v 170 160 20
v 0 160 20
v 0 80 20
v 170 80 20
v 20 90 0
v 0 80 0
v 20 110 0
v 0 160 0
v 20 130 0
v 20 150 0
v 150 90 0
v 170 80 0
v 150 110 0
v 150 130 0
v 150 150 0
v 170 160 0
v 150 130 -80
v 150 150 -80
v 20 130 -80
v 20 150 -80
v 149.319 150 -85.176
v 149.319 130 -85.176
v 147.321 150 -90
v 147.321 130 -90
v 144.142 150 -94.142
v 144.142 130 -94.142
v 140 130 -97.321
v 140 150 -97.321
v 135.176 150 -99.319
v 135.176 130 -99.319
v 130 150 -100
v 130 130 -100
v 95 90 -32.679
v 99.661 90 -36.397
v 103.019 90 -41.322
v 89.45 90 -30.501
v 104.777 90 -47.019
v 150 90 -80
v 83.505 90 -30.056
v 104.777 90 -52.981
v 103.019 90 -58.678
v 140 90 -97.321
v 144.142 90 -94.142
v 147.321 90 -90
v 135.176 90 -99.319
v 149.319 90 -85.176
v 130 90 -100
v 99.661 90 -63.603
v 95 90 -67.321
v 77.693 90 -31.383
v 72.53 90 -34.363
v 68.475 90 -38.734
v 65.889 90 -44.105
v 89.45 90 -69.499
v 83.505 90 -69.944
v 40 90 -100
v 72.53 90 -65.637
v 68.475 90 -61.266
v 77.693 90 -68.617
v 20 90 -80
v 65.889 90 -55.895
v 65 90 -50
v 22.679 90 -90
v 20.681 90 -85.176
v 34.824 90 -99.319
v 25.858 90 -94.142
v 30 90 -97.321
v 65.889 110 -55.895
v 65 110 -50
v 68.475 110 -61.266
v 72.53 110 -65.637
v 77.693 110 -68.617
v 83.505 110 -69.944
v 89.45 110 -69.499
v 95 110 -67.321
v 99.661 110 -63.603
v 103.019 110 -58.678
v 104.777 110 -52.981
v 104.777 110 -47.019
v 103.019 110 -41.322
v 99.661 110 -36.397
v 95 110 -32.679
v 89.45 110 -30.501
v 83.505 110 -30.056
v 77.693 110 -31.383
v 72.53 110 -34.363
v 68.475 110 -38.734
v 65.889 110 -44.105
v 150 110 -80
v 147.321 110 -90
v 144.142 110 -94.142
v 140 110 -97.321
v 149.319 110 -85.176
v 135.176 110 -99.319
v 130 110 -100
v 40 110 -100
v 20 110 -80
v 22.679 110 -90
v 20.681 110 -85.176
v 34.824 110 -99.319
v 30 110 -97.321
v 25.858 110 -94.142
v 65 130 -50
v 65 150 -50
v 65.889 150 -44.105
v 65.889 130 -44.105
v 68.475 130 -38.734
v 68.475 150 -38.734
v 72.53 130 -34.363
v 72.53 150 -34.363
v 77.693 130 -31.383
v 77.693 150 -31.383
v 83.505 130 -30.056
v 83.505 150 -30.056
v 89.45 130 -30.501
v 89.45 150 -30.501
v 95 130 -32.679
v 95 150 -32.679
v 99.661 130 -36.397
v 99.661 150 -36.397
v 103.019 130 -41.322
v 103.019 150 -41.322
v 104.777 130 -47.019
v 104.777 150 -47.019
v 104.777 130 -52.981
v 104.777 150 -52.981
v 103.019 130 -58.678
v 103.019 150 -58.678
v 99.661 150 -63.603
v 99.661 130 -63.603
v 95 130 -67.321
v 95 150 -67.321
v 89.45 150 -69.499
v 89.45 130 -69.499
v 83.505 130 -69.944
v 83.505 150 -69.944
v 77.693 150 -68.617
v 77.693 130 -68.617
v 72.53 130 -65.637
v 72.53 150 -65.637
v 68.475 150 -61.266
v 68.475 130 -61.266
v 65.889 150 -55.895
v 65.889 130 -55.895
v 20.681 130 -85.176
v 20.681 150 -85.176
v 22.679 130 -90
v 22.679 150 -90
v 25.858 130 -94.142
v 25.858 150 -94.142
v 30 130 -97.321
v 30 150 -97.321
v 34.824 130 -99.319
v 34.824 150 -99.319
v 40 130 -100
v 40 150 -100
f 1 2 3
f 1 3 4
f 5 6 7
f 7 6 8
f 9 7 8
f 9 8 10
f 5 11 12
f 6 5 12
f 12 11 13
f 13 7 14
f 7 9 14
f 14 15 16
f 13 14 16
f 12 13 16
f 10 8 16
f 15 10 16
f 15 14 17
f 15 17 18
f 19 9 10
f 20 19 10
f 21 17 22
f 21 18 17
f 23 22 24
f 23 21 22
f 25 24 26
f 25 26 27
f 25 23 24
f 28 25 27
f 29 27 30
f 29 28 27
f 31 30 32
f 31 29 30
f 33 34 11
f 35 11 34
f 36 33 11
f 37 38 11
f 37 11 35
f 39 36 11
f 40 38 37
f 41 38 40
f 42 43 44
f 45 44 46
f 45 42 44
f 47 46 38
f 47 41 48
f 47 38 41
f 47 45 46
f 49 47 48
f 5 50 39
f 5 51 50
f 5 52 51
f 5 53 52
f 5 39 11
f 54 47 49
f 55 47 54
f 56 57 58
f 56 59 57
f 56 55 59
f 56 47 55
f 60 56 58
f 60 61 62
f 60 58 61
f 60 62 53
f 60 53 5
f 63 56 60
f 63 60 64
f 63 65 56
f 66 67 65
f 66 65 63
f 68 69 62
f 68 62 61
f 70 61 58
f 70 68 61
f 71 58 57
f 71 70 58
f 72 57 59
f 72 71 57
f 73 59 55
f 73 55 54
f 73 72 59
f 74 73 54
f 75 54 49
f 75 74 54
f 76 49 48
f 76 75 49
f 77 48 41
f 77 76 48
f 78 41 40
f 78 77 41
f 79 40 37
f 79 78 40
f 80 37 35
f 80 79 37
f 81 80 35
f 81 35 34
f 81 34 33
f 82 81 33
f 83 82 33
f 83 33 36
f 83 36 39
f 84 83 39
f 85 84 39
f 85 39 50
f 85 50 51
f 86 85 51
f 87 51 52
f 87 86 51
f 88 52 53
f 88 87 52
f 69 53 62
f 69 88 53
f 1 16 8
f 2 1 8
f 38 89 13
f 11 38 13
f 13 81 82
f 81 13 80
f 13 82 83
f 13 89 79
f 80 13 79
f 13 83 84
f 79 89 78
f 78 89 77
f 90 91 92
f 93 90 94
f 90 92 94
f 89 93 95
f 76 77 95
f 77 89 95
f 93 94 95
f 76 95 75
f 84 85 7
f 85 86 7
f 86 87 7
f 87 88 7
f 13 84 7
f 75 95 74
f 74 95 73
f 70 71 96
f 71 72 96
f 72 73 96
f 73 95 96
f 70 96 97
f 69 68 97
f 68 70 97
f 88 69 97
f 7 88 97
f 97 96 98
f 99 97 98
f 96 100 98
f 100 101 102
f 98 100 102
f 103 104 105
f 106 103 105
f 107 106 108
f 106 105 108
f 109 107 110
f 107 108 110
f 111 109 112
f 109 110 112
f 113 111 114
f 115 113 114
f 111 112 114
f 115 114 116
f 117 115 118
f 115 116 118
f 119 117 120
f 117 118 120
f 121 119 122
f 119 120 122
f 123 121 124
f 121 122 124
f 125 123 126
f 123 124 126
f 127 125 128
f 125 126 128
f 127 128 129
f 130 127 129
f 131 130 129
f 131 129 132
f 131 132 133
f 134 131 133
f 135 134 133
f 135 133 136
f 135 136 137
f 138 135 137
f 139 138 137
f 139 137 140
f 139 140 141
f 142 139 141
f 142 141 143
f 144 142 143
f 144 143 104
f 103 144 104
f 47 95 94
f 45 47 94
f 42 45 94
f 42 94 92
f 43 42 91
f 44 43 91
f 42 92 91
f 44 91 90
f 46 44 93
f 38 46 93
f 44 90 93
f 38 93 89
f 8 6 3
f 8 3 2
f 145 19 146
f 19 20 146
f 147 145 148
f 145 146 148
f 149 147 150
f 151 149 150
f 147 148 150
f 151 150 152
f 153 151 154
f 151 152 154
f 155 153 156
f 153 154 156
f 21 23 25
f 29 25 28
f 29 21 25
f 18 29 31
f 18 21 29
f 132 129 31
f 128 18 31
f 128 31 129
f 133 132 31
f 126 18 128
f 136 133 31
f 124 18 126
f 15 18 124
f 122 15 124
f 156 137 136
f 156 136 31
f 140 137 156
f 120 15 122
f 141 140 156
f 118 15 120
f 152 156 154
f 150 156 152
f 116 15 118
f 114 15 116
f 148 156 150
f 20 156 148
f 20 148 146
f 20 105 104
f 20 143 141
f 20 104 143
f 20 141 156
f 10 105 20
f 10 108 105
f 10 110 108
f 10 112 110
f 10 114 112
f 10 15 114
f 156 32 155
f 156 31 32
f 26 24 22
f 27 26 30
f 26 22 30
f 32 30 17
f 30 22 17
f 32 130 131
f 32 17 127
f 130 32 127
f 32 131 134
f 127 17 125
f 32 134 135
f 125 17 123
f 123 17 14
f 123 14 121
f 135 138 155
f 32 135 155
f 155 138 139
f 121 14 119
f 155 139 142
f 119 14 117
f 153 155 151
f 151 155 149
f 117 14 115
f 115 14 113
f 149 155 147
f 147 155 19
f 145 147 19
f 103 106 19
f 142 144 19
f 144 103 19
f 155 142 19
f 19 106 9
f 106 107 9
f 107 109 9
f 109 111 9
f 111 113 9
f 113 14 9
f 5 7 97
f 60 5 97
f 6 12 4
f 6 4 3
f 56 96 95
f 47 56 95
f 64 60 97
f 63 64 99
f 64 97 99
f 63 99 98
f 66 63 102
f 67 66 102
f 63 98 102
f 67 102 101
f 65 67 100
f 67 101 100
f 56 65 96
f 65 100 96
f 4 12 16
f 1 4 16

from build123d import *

# Parameters (mm, degrees)
IZIM1_W                     = 170
IZIM1_H                     = 200
Y_KSEKLIK_EKSTR_ZYON1_DEPTH = 20
IZIM2_W                     = 130
IZIM2_H                     = 20
Y_KSEKLIK_EKSTR_ZYON2_DEPTH = 100
RADYUS1_R                   = 20
IZIM3_R                     = 20
KES_EKSTR_ZYON1_DEPTH       = 100
IZIM4_R                     = 20
Y_KSEKLIK_EKSTR_ZYON3_DEPTH = 20
IZIM5_W                     = 170
IZIM5_H                     = 40
IZIM5_H_2                   = 80
KES_EKSTR_ZYON2_DEPTH       = 79


with BuildPart() as part:
    # Çizim1 → Yükseklik-Ekstrüzyon1 (new body)
    with BuildSketch(Plane.XY):
        with Locations((85, 100)):
            Rectangle(IZIM1_W, IZIM1_H)
    extrude(amount=Y_KSEKLIK_EKSTR_ZYON1_DEPTH)

    # Çizim2 → Yükseklik-Ekstrüzyon2 (add)
    with BuildSketch(Plane(origin=(0, 0, 0), x_dir=(-1, 0, 0), z_dir=(0, 0, -1))):
        with Locations((-85, 140)):
            Rectangle(IZIM2_W, IZIM2_H)
    extrude(amount=Y_KSEKLIK_EKSTR_ZYON2_DEPTH)

    # Radyus1
    radyus1_edges = [part.edges().sort_by_distance(p)[0] for p in [
        (150, 140, -100),
        (20, 140, -100),
    ]]
    fillet(radyus1_edges, radius=RADYUS1_R)

    # Çizim3 → Kes-Ekstrüzyon1 (cut)
    with BuildSketch(Plane(origin=(0, 150, 0), x_dir=(1, 0, 0), z_dir=(0, 1, 0))):
        with Locations(Location((85, 50, 0), (0, 0, 180))):
            Circle(IZIM3_R)
    extrude(amount=-KES_EKSTR_ZYON1_DEPTH, mode=Mode.SUBTRACT)

    # Çizim4 → Yükseklik-Ekstrüzyon3 (add)
    with BuildSketch(Plane(origin=(0, 110, 0), x_dir=(-1, 0, 0), z_dir=(0, -1, 0))):
        with BuildLine():
            Line((-20, 0), (-20, 80))
            ThreePointArc((-20, 80), (-25.857864376, 94.142135624), (-40, 100))
            Line((-40, 100), (-130, 100))
            ThreePointArc((-130, 100), (-144.142135624, 94.142135624), (-150, 80))
            Line((-150, 80), (-150, 0))
            Line((-150, 0), (-20, 0))
        make_face()
        with Locations((-85, 50)):
            Circle(IZIM4_R, mode=Mode.SUBTRACT)
    extrude(amount=Y_KSEKLIK_EKSTR_ZYON3_DEPTH)

    # Çizim5 → Kes-Ekstrüzyon2 (cut)
    with BuildSketch(Plane(origin=(0, 0, 0), x_dir=(-1, 0, 0), z_dir=(0, 0, -1))):
        with Locations((-85, 180)):
            Rectangle(IZIM5_W, IZIM5_H)
        with Locations((-85, 40)):
            Rectangle(IZIM5_W, IZIM5_H_2)
    extrude(amount=-KES_EKSTR_ZYON2_DEPTH, mode=Mode.SUBTRACT)


solid = part.part
